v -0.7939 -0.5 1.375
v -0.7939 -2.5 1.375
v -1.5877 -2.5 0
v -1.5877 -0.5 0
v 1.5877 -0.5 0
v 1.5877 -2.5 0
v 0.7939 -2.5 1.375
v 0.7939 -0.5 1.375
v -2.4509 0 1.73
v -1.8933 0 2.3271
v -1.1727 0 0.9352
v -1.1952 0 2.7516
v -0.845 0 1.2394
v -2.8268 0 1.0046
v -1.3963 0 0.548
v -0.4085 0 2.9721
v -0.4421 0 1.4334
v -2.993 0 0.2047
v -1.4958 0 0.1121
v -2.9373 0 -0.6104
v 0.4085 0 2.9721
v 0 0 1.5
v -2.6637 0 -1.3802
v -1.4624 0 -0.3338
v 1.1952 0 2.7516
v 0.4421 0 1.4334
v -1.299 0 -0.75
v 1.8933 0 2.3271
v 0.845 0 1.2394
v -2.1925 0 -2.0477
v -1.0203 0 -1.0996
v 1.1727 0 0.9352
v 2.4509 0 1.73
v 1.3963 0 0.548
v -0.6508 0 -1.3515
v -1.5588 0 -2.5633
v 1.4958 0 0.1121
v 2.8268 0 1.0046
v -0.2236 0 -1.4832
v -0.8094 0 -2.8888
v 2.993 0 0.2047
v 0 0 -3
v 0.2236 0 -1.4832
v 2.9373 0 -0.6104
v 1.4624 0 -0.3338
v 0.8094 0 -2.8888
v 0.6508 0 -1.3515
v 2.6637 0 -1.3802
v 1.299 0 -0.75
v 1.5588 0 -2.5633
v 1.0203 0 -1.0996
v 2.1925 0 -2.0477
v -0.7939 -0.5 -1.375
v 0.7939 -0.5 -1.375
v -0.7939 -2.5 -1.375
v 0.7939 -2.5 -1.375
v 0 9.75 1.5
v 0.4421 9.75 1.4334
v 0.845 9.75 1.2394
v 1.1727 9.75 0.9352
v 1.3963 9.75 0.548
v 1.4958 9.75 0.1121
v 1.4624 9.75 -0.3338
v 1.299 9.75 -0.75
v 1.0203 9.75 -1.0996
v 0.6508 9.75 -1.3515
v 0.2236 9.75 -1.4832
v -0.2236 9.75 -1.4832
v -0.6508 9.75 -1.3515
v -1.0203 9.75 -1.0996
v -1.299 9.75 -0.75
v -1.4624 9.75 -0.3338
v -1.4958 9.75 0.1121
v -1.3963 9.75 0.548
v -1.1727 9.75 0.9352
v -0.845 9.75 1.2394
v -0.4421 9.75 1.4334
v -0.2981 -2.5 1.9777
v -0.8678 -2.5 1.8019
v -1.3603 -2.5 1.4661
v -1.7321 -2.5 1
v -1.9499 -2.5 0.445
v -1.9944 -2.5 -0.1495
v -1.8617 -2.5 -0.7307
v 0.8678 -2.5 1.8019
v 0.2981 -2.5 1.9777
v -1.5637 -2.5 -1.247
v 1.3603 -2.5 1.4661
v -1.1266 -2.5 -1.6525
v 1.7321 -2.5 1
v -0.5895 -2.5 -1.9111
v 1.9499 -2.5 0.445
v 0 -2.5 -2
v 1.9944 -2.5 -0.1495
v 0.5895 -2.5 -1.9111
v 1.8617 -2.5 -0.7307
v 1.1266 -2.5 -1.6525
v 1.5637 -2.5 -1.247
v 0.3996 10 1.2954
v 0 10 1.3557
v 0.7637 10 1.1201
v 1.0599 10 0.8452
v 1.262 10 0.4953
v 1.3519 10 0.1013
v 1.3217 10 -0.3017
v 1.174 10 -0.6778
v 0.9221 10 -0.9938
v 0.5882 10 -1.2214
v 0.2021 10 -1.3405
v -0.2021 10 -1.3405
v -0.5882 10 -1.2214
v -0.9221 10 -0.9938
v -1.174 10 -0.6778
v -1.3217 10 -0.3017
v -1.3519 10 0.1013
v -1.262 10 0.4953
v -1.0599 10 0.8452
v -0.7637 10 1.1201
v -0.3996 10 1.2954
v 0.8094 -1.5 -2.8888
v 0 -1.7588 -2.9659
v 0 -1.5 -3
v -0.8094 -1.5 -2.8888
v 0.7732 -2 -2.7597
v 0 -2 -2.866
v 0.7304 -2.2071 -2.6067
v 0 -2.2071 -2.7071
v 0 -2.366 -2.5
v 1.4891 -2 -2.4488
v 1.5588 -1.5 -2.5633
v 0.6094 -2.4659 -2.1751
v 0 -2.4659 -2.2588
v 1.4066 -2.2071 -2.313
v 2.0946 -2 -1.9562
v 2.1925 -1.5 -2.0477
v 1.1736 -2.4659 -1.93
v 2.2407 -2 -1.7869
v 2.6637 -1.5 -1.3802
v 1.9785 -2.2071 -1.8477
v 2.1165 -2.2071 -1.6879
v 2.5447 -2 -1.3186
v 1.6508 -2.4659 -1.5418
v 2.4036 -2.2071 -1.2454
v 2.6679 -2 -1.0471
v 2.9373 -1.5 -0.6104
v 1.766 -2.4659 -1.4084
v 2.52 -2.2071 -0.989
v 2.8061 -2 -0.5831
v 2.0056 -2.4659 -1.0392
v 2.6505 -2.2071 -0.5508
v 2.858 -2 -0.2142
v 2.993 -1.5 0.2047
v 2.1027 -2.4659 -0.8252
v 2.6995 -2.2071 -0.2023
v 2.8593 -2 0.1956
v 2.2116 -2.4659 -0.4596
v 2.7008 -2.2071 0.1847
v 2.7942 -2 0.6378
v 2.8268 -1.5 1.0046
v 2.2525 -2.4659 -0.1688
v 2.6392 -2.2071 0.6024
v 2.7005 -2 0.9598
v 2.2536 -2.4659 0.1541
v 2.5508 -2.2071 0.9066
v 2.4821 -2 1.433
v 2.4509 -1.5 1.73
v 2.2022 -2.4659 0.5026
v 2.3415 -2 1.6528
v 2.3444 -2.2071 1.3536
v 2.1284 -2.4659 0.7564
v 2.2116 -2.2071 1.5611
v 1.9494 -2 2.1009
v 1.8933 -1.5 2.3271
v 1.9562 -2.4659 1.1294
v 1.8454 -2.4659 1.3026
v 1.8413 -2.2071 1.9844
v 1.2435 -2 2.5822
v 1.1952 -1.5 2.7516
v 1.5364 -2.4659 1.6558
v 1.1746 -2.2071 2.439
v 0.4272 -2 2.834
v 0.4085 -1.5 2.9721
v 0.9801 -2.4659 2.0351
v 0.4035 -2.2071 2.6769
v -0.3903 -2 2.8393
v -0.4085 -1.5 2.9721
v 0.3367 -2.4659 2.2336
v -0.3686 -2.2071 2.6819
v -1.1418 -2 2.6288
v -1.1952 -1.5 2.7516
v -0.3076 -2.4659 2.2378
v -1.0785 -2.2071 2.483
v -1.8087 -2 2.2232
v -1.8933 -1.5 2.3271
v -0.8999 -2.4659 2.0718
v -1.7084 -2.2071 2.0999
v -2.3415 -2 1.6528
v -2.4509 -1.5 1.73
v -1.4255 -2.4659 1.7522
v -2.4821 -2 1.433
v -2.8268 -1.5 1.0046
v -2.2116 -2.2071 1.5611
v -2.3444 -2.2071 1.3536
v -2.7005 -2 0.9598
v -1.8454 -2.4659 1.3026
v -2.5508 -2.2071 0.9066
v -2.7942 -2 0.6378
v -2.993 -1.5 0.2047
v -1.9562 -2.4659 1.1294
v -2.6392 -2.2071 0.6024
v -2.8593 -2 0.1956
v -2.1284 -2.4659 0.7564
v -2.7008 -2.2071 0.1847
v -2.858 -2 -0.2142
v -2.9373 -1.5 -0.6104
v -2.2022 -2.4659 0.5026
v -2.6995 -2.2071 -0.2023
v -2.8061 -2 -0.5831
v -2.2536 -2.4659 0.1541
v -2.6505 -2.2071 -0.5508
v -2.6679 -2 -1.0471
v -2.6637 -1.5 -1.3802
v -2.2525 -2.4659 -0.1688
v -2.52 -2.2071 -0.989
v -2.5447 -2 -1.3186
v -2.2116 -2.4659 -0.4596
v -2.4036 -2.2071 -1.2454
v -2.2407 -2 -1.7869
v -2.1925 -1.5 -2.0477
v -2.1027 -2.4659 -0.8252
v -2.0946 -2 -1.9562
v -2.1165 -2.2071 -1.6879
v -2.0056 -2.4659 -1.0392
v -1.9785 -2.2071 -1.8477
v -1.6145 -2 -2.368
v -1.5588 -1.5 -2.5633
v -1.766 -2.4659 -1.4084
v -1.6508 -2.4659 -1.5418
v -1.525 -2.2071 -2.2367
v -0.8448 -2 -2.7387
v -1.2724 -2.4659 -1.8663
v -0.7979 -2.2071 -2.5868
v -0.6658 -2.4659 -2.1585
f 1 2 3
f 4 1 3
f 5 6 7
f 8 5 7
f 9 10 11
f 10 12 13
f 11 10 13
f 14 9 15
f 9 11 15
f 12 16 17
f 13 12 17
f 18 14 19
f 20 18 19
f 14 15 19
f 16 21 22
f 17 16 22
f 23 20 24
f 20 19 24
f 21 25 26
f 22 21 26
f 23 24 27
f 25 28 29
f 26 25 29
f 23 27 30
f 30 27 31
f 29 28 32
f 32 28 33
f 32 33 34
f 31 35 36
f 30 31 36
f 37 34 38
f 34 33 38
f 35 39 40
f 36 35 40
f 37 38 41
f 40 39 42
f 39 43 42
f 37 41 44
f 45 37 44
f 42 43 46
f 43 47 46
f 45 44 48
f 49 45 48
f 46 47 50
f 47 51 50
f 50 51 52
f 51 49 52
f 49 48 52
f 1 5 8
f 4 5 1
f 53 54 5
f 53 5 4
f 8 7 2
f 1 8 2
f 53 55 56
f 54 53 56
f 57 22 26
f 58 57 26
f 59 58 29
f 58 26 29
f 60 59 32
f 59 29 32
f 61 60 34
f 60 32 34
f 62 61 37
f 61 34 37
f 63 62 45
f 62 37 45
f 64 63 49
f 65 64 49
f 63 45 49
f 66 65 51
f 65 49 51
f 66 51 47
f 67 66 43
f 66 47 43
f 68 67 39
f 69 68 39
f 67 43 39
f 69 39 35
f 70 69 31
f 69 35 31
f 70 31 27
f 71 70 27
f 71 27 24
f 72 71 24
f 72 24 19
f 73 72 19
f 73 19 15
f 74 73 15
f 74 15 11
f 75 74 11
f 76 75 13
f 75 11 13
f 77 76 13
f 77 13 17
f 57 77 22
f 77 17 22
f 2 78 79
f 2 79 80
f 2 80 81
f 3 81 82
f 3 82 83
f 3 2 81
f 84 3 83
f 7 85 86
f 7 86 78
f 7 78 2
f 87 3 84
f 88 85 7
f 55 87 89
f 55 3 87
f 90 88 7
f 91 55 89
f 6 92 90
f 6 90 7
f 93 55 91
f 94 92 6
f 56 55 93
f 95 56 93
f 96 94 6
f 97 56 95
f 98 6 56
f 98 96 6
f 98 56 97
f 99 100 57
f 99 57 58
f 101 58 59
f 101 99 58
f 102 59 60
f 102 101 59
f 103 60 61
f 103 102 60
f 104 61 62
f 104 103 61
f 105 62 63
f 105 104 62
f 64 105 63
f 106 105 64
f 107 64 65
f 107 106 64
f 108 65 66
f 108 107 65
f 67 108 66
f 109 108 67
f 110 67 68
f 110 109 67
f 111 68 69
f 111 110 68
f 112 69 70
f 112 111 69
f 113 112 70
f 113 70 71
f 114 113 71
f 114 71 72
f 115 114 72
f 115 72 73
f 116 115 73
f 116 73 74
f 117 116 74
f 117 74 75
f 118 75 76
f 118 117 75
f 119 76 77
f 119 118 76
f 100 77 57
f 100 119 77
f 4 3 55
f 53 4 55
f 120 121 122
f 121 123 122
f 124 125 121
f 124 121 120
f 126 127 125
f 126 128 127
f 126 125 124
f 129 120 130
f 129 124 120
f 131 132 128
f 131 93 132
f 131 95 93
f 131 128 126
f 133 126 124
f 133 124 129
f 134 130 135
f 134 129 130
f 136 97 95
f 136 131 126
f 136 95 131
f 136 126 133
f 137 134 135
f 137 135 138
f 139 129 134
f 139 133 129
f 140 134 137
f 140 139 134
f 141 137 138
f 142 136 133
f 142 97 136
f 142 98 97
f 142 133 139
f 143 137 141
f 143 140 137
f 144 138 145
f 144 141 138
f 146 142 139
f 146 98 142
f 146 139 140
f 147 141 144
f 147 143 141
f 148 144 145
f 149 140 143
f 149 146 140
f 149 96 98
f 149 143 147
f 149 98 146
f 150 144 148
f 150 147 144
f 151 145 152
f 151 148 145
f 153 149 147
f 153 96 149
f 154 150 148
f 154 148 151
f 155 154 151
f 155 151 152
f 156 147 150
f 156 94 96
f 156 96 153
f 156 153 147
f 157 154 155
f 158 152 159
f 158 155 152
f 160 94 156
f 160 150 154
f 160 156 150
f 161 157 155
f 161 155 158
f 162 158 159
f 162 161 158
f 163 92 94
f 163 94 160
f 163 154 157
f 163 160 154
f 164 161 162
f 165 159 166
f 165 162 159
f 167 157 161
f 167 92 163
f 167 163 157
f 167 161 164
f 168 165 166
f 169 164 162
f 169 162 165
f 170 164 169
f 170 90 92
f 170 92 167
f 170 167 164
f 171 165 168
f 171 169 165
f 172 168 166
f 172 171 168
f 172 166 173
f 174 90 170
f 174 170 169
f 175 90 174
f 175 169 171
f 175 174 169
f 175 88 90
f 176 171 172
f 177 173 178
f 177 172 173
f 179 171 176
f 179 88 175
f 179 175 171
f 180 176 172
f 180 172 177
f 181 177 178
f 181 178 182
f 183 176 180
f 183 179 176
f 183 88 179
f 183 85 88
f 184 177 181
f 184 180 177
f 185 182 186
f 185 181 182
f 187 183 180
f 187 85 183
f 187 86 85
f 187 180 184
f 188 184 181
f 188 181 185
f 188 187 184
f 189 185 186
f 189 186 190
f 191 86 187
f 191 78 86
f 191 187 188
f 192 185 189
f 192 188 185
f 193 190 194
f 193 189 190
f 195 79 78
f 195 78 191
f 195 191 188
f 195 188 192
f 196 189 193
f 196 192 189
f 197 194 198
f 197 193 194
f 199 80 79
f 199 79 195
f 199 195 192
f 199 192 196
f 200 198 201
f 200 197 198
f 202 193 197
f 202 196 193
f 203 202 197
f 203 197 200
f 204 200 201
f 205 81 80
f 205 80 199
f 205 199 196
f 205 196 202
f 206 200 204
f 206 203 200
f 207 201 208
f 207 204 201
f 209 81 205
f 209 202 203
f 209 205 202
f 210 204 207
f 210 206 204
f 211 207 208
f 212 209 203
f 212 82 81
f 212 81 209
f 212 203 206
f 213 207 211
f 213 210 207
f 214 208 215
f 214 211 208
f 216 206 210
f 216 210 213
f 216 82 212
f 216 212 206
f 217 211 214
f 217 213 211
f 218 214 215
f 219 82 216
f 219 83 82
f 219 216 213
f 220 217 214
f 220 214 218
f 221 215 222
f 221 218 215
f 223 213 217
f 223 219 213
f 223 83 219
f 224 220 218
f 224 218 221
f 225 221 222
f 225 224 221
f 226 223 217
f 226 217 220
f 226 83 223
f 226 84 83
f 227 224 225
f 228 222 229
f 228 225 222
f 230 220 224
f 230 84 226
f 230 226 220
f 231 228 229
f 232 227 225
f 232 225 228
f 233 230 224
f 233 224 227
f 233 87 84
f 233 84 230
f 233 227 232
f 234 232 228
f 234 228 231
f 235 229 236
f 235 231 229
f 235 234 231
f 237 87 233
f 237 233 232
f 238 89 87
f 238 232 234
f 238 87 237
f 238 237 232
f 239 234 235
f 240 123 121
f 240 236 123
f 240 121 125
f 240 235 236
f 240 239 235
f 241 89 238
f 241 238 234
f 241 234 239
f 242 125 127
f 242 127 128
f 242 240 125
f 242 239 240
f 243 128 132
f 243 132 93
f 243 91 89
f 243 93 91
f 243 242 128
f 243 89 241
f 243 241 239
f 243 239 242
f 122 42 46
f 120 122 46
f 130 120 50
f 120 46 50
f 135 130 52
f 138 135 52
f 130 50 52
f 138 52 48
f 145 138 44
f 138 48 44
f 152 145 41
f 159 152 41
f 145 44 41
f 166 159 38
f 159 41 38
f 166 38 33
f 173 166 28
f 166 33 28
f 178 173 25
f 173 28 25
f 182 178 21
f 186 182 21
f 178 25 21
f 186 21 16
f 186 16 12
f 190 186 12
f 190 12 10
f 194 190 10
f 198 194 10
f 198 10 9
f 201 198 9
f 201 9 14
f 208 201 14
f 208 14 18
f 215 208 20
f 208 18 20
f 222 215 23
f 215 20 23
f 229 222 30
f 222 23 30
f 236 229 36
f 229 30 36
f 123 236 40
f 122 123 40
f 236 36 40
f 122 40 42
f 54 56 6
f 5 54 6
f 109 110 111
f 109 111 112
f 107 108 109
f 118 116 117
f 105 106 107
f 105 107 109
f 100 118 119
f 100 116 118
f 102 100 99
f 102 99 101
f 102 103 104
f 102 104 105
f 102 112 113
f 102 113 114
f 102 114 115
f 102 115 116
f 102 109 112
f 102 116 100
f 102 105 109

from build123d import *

# Parameters (mm, degrees)
SKETCH1_R           = 1.5
BOSS_EXTRUDE1_DEPTH = 10
CHAMFER1_SIZE       = 0.25
CHAMFER1_SIZE2      = 0.144337567
SKETCH2_R           = 3
BOSS_EXTRUDE2_DEPTH = 2.5
FILLET1_R           = 1
CUT_EXTRUDE1_DEPTH  = 2


with BuildPart() as part:
    # Sketch1 → Boss-Extrude1 (new body)
    with BuildSketch(Plane(origin=(0, 0, 0), x_dir=(1, 0, 0), z_dir=(0, 1, 0))):
        with Locations(Location((0, 0, 0), (0, 0, 270))):
            Circle(SKETCH1_R)
    extrude(amount=BOSS_EXTRUDE1_DEPTH)

    # Chamfer1
    chamfer1_edges = [part.edges().sort_by_distance(p)[0] for p in [
        (0, 10, -1.5),
    ]]
    chamfer1_side = [part.faces().sort_by_distance(p)[0] for p in [
        (0, 5, -1.5),
    ]]
    chamfer(chamfer1_edges, length=CHAMFER1_SIZE, length2=CHAMFER1_SIZE2, reference=chamfer1_side[0])

    # Sketch2 → Boss-Extrude2 (add)
    with BuildSketch(Plane(origin=(0, 0, 0), x_dir=(-1, 0, 0), z_dir=(0, -1, 0))):
        with Locations(Location((0, 0, 0), (0, 0, 90))):
            Circle(SKETCH2_R)
    extrude(amount=BOSS_EXTRUDE2_DEPTH)

    # Fillet1
    fillet1_edges = [part.edges().sort_by_distance(p)[0] for p in [
        (0, -2.5, 3),
    ]]
    fillet(fillet1_edges, radius=FILLET1_R)

    # Sketch3 → Cut-Extrude1 (cut)
    with BuildSketch(Plane(origin=(0, -2.5, 0), x_dir=(-1, 0, 0), z_dir=(0, -1, 0))):
        Polygon((1.58771324, 0), (0.79385662, 1.375), (-0.79385662, 1.375), (-1.58771324, 0), (-0.79385662, -1.375), (0.79385662, -1.375), align=None)
    extrude(amount=-CUT_EXTRUDE1_DEPTH, mode=Mode.SUBTRACT)


solid = part.part
